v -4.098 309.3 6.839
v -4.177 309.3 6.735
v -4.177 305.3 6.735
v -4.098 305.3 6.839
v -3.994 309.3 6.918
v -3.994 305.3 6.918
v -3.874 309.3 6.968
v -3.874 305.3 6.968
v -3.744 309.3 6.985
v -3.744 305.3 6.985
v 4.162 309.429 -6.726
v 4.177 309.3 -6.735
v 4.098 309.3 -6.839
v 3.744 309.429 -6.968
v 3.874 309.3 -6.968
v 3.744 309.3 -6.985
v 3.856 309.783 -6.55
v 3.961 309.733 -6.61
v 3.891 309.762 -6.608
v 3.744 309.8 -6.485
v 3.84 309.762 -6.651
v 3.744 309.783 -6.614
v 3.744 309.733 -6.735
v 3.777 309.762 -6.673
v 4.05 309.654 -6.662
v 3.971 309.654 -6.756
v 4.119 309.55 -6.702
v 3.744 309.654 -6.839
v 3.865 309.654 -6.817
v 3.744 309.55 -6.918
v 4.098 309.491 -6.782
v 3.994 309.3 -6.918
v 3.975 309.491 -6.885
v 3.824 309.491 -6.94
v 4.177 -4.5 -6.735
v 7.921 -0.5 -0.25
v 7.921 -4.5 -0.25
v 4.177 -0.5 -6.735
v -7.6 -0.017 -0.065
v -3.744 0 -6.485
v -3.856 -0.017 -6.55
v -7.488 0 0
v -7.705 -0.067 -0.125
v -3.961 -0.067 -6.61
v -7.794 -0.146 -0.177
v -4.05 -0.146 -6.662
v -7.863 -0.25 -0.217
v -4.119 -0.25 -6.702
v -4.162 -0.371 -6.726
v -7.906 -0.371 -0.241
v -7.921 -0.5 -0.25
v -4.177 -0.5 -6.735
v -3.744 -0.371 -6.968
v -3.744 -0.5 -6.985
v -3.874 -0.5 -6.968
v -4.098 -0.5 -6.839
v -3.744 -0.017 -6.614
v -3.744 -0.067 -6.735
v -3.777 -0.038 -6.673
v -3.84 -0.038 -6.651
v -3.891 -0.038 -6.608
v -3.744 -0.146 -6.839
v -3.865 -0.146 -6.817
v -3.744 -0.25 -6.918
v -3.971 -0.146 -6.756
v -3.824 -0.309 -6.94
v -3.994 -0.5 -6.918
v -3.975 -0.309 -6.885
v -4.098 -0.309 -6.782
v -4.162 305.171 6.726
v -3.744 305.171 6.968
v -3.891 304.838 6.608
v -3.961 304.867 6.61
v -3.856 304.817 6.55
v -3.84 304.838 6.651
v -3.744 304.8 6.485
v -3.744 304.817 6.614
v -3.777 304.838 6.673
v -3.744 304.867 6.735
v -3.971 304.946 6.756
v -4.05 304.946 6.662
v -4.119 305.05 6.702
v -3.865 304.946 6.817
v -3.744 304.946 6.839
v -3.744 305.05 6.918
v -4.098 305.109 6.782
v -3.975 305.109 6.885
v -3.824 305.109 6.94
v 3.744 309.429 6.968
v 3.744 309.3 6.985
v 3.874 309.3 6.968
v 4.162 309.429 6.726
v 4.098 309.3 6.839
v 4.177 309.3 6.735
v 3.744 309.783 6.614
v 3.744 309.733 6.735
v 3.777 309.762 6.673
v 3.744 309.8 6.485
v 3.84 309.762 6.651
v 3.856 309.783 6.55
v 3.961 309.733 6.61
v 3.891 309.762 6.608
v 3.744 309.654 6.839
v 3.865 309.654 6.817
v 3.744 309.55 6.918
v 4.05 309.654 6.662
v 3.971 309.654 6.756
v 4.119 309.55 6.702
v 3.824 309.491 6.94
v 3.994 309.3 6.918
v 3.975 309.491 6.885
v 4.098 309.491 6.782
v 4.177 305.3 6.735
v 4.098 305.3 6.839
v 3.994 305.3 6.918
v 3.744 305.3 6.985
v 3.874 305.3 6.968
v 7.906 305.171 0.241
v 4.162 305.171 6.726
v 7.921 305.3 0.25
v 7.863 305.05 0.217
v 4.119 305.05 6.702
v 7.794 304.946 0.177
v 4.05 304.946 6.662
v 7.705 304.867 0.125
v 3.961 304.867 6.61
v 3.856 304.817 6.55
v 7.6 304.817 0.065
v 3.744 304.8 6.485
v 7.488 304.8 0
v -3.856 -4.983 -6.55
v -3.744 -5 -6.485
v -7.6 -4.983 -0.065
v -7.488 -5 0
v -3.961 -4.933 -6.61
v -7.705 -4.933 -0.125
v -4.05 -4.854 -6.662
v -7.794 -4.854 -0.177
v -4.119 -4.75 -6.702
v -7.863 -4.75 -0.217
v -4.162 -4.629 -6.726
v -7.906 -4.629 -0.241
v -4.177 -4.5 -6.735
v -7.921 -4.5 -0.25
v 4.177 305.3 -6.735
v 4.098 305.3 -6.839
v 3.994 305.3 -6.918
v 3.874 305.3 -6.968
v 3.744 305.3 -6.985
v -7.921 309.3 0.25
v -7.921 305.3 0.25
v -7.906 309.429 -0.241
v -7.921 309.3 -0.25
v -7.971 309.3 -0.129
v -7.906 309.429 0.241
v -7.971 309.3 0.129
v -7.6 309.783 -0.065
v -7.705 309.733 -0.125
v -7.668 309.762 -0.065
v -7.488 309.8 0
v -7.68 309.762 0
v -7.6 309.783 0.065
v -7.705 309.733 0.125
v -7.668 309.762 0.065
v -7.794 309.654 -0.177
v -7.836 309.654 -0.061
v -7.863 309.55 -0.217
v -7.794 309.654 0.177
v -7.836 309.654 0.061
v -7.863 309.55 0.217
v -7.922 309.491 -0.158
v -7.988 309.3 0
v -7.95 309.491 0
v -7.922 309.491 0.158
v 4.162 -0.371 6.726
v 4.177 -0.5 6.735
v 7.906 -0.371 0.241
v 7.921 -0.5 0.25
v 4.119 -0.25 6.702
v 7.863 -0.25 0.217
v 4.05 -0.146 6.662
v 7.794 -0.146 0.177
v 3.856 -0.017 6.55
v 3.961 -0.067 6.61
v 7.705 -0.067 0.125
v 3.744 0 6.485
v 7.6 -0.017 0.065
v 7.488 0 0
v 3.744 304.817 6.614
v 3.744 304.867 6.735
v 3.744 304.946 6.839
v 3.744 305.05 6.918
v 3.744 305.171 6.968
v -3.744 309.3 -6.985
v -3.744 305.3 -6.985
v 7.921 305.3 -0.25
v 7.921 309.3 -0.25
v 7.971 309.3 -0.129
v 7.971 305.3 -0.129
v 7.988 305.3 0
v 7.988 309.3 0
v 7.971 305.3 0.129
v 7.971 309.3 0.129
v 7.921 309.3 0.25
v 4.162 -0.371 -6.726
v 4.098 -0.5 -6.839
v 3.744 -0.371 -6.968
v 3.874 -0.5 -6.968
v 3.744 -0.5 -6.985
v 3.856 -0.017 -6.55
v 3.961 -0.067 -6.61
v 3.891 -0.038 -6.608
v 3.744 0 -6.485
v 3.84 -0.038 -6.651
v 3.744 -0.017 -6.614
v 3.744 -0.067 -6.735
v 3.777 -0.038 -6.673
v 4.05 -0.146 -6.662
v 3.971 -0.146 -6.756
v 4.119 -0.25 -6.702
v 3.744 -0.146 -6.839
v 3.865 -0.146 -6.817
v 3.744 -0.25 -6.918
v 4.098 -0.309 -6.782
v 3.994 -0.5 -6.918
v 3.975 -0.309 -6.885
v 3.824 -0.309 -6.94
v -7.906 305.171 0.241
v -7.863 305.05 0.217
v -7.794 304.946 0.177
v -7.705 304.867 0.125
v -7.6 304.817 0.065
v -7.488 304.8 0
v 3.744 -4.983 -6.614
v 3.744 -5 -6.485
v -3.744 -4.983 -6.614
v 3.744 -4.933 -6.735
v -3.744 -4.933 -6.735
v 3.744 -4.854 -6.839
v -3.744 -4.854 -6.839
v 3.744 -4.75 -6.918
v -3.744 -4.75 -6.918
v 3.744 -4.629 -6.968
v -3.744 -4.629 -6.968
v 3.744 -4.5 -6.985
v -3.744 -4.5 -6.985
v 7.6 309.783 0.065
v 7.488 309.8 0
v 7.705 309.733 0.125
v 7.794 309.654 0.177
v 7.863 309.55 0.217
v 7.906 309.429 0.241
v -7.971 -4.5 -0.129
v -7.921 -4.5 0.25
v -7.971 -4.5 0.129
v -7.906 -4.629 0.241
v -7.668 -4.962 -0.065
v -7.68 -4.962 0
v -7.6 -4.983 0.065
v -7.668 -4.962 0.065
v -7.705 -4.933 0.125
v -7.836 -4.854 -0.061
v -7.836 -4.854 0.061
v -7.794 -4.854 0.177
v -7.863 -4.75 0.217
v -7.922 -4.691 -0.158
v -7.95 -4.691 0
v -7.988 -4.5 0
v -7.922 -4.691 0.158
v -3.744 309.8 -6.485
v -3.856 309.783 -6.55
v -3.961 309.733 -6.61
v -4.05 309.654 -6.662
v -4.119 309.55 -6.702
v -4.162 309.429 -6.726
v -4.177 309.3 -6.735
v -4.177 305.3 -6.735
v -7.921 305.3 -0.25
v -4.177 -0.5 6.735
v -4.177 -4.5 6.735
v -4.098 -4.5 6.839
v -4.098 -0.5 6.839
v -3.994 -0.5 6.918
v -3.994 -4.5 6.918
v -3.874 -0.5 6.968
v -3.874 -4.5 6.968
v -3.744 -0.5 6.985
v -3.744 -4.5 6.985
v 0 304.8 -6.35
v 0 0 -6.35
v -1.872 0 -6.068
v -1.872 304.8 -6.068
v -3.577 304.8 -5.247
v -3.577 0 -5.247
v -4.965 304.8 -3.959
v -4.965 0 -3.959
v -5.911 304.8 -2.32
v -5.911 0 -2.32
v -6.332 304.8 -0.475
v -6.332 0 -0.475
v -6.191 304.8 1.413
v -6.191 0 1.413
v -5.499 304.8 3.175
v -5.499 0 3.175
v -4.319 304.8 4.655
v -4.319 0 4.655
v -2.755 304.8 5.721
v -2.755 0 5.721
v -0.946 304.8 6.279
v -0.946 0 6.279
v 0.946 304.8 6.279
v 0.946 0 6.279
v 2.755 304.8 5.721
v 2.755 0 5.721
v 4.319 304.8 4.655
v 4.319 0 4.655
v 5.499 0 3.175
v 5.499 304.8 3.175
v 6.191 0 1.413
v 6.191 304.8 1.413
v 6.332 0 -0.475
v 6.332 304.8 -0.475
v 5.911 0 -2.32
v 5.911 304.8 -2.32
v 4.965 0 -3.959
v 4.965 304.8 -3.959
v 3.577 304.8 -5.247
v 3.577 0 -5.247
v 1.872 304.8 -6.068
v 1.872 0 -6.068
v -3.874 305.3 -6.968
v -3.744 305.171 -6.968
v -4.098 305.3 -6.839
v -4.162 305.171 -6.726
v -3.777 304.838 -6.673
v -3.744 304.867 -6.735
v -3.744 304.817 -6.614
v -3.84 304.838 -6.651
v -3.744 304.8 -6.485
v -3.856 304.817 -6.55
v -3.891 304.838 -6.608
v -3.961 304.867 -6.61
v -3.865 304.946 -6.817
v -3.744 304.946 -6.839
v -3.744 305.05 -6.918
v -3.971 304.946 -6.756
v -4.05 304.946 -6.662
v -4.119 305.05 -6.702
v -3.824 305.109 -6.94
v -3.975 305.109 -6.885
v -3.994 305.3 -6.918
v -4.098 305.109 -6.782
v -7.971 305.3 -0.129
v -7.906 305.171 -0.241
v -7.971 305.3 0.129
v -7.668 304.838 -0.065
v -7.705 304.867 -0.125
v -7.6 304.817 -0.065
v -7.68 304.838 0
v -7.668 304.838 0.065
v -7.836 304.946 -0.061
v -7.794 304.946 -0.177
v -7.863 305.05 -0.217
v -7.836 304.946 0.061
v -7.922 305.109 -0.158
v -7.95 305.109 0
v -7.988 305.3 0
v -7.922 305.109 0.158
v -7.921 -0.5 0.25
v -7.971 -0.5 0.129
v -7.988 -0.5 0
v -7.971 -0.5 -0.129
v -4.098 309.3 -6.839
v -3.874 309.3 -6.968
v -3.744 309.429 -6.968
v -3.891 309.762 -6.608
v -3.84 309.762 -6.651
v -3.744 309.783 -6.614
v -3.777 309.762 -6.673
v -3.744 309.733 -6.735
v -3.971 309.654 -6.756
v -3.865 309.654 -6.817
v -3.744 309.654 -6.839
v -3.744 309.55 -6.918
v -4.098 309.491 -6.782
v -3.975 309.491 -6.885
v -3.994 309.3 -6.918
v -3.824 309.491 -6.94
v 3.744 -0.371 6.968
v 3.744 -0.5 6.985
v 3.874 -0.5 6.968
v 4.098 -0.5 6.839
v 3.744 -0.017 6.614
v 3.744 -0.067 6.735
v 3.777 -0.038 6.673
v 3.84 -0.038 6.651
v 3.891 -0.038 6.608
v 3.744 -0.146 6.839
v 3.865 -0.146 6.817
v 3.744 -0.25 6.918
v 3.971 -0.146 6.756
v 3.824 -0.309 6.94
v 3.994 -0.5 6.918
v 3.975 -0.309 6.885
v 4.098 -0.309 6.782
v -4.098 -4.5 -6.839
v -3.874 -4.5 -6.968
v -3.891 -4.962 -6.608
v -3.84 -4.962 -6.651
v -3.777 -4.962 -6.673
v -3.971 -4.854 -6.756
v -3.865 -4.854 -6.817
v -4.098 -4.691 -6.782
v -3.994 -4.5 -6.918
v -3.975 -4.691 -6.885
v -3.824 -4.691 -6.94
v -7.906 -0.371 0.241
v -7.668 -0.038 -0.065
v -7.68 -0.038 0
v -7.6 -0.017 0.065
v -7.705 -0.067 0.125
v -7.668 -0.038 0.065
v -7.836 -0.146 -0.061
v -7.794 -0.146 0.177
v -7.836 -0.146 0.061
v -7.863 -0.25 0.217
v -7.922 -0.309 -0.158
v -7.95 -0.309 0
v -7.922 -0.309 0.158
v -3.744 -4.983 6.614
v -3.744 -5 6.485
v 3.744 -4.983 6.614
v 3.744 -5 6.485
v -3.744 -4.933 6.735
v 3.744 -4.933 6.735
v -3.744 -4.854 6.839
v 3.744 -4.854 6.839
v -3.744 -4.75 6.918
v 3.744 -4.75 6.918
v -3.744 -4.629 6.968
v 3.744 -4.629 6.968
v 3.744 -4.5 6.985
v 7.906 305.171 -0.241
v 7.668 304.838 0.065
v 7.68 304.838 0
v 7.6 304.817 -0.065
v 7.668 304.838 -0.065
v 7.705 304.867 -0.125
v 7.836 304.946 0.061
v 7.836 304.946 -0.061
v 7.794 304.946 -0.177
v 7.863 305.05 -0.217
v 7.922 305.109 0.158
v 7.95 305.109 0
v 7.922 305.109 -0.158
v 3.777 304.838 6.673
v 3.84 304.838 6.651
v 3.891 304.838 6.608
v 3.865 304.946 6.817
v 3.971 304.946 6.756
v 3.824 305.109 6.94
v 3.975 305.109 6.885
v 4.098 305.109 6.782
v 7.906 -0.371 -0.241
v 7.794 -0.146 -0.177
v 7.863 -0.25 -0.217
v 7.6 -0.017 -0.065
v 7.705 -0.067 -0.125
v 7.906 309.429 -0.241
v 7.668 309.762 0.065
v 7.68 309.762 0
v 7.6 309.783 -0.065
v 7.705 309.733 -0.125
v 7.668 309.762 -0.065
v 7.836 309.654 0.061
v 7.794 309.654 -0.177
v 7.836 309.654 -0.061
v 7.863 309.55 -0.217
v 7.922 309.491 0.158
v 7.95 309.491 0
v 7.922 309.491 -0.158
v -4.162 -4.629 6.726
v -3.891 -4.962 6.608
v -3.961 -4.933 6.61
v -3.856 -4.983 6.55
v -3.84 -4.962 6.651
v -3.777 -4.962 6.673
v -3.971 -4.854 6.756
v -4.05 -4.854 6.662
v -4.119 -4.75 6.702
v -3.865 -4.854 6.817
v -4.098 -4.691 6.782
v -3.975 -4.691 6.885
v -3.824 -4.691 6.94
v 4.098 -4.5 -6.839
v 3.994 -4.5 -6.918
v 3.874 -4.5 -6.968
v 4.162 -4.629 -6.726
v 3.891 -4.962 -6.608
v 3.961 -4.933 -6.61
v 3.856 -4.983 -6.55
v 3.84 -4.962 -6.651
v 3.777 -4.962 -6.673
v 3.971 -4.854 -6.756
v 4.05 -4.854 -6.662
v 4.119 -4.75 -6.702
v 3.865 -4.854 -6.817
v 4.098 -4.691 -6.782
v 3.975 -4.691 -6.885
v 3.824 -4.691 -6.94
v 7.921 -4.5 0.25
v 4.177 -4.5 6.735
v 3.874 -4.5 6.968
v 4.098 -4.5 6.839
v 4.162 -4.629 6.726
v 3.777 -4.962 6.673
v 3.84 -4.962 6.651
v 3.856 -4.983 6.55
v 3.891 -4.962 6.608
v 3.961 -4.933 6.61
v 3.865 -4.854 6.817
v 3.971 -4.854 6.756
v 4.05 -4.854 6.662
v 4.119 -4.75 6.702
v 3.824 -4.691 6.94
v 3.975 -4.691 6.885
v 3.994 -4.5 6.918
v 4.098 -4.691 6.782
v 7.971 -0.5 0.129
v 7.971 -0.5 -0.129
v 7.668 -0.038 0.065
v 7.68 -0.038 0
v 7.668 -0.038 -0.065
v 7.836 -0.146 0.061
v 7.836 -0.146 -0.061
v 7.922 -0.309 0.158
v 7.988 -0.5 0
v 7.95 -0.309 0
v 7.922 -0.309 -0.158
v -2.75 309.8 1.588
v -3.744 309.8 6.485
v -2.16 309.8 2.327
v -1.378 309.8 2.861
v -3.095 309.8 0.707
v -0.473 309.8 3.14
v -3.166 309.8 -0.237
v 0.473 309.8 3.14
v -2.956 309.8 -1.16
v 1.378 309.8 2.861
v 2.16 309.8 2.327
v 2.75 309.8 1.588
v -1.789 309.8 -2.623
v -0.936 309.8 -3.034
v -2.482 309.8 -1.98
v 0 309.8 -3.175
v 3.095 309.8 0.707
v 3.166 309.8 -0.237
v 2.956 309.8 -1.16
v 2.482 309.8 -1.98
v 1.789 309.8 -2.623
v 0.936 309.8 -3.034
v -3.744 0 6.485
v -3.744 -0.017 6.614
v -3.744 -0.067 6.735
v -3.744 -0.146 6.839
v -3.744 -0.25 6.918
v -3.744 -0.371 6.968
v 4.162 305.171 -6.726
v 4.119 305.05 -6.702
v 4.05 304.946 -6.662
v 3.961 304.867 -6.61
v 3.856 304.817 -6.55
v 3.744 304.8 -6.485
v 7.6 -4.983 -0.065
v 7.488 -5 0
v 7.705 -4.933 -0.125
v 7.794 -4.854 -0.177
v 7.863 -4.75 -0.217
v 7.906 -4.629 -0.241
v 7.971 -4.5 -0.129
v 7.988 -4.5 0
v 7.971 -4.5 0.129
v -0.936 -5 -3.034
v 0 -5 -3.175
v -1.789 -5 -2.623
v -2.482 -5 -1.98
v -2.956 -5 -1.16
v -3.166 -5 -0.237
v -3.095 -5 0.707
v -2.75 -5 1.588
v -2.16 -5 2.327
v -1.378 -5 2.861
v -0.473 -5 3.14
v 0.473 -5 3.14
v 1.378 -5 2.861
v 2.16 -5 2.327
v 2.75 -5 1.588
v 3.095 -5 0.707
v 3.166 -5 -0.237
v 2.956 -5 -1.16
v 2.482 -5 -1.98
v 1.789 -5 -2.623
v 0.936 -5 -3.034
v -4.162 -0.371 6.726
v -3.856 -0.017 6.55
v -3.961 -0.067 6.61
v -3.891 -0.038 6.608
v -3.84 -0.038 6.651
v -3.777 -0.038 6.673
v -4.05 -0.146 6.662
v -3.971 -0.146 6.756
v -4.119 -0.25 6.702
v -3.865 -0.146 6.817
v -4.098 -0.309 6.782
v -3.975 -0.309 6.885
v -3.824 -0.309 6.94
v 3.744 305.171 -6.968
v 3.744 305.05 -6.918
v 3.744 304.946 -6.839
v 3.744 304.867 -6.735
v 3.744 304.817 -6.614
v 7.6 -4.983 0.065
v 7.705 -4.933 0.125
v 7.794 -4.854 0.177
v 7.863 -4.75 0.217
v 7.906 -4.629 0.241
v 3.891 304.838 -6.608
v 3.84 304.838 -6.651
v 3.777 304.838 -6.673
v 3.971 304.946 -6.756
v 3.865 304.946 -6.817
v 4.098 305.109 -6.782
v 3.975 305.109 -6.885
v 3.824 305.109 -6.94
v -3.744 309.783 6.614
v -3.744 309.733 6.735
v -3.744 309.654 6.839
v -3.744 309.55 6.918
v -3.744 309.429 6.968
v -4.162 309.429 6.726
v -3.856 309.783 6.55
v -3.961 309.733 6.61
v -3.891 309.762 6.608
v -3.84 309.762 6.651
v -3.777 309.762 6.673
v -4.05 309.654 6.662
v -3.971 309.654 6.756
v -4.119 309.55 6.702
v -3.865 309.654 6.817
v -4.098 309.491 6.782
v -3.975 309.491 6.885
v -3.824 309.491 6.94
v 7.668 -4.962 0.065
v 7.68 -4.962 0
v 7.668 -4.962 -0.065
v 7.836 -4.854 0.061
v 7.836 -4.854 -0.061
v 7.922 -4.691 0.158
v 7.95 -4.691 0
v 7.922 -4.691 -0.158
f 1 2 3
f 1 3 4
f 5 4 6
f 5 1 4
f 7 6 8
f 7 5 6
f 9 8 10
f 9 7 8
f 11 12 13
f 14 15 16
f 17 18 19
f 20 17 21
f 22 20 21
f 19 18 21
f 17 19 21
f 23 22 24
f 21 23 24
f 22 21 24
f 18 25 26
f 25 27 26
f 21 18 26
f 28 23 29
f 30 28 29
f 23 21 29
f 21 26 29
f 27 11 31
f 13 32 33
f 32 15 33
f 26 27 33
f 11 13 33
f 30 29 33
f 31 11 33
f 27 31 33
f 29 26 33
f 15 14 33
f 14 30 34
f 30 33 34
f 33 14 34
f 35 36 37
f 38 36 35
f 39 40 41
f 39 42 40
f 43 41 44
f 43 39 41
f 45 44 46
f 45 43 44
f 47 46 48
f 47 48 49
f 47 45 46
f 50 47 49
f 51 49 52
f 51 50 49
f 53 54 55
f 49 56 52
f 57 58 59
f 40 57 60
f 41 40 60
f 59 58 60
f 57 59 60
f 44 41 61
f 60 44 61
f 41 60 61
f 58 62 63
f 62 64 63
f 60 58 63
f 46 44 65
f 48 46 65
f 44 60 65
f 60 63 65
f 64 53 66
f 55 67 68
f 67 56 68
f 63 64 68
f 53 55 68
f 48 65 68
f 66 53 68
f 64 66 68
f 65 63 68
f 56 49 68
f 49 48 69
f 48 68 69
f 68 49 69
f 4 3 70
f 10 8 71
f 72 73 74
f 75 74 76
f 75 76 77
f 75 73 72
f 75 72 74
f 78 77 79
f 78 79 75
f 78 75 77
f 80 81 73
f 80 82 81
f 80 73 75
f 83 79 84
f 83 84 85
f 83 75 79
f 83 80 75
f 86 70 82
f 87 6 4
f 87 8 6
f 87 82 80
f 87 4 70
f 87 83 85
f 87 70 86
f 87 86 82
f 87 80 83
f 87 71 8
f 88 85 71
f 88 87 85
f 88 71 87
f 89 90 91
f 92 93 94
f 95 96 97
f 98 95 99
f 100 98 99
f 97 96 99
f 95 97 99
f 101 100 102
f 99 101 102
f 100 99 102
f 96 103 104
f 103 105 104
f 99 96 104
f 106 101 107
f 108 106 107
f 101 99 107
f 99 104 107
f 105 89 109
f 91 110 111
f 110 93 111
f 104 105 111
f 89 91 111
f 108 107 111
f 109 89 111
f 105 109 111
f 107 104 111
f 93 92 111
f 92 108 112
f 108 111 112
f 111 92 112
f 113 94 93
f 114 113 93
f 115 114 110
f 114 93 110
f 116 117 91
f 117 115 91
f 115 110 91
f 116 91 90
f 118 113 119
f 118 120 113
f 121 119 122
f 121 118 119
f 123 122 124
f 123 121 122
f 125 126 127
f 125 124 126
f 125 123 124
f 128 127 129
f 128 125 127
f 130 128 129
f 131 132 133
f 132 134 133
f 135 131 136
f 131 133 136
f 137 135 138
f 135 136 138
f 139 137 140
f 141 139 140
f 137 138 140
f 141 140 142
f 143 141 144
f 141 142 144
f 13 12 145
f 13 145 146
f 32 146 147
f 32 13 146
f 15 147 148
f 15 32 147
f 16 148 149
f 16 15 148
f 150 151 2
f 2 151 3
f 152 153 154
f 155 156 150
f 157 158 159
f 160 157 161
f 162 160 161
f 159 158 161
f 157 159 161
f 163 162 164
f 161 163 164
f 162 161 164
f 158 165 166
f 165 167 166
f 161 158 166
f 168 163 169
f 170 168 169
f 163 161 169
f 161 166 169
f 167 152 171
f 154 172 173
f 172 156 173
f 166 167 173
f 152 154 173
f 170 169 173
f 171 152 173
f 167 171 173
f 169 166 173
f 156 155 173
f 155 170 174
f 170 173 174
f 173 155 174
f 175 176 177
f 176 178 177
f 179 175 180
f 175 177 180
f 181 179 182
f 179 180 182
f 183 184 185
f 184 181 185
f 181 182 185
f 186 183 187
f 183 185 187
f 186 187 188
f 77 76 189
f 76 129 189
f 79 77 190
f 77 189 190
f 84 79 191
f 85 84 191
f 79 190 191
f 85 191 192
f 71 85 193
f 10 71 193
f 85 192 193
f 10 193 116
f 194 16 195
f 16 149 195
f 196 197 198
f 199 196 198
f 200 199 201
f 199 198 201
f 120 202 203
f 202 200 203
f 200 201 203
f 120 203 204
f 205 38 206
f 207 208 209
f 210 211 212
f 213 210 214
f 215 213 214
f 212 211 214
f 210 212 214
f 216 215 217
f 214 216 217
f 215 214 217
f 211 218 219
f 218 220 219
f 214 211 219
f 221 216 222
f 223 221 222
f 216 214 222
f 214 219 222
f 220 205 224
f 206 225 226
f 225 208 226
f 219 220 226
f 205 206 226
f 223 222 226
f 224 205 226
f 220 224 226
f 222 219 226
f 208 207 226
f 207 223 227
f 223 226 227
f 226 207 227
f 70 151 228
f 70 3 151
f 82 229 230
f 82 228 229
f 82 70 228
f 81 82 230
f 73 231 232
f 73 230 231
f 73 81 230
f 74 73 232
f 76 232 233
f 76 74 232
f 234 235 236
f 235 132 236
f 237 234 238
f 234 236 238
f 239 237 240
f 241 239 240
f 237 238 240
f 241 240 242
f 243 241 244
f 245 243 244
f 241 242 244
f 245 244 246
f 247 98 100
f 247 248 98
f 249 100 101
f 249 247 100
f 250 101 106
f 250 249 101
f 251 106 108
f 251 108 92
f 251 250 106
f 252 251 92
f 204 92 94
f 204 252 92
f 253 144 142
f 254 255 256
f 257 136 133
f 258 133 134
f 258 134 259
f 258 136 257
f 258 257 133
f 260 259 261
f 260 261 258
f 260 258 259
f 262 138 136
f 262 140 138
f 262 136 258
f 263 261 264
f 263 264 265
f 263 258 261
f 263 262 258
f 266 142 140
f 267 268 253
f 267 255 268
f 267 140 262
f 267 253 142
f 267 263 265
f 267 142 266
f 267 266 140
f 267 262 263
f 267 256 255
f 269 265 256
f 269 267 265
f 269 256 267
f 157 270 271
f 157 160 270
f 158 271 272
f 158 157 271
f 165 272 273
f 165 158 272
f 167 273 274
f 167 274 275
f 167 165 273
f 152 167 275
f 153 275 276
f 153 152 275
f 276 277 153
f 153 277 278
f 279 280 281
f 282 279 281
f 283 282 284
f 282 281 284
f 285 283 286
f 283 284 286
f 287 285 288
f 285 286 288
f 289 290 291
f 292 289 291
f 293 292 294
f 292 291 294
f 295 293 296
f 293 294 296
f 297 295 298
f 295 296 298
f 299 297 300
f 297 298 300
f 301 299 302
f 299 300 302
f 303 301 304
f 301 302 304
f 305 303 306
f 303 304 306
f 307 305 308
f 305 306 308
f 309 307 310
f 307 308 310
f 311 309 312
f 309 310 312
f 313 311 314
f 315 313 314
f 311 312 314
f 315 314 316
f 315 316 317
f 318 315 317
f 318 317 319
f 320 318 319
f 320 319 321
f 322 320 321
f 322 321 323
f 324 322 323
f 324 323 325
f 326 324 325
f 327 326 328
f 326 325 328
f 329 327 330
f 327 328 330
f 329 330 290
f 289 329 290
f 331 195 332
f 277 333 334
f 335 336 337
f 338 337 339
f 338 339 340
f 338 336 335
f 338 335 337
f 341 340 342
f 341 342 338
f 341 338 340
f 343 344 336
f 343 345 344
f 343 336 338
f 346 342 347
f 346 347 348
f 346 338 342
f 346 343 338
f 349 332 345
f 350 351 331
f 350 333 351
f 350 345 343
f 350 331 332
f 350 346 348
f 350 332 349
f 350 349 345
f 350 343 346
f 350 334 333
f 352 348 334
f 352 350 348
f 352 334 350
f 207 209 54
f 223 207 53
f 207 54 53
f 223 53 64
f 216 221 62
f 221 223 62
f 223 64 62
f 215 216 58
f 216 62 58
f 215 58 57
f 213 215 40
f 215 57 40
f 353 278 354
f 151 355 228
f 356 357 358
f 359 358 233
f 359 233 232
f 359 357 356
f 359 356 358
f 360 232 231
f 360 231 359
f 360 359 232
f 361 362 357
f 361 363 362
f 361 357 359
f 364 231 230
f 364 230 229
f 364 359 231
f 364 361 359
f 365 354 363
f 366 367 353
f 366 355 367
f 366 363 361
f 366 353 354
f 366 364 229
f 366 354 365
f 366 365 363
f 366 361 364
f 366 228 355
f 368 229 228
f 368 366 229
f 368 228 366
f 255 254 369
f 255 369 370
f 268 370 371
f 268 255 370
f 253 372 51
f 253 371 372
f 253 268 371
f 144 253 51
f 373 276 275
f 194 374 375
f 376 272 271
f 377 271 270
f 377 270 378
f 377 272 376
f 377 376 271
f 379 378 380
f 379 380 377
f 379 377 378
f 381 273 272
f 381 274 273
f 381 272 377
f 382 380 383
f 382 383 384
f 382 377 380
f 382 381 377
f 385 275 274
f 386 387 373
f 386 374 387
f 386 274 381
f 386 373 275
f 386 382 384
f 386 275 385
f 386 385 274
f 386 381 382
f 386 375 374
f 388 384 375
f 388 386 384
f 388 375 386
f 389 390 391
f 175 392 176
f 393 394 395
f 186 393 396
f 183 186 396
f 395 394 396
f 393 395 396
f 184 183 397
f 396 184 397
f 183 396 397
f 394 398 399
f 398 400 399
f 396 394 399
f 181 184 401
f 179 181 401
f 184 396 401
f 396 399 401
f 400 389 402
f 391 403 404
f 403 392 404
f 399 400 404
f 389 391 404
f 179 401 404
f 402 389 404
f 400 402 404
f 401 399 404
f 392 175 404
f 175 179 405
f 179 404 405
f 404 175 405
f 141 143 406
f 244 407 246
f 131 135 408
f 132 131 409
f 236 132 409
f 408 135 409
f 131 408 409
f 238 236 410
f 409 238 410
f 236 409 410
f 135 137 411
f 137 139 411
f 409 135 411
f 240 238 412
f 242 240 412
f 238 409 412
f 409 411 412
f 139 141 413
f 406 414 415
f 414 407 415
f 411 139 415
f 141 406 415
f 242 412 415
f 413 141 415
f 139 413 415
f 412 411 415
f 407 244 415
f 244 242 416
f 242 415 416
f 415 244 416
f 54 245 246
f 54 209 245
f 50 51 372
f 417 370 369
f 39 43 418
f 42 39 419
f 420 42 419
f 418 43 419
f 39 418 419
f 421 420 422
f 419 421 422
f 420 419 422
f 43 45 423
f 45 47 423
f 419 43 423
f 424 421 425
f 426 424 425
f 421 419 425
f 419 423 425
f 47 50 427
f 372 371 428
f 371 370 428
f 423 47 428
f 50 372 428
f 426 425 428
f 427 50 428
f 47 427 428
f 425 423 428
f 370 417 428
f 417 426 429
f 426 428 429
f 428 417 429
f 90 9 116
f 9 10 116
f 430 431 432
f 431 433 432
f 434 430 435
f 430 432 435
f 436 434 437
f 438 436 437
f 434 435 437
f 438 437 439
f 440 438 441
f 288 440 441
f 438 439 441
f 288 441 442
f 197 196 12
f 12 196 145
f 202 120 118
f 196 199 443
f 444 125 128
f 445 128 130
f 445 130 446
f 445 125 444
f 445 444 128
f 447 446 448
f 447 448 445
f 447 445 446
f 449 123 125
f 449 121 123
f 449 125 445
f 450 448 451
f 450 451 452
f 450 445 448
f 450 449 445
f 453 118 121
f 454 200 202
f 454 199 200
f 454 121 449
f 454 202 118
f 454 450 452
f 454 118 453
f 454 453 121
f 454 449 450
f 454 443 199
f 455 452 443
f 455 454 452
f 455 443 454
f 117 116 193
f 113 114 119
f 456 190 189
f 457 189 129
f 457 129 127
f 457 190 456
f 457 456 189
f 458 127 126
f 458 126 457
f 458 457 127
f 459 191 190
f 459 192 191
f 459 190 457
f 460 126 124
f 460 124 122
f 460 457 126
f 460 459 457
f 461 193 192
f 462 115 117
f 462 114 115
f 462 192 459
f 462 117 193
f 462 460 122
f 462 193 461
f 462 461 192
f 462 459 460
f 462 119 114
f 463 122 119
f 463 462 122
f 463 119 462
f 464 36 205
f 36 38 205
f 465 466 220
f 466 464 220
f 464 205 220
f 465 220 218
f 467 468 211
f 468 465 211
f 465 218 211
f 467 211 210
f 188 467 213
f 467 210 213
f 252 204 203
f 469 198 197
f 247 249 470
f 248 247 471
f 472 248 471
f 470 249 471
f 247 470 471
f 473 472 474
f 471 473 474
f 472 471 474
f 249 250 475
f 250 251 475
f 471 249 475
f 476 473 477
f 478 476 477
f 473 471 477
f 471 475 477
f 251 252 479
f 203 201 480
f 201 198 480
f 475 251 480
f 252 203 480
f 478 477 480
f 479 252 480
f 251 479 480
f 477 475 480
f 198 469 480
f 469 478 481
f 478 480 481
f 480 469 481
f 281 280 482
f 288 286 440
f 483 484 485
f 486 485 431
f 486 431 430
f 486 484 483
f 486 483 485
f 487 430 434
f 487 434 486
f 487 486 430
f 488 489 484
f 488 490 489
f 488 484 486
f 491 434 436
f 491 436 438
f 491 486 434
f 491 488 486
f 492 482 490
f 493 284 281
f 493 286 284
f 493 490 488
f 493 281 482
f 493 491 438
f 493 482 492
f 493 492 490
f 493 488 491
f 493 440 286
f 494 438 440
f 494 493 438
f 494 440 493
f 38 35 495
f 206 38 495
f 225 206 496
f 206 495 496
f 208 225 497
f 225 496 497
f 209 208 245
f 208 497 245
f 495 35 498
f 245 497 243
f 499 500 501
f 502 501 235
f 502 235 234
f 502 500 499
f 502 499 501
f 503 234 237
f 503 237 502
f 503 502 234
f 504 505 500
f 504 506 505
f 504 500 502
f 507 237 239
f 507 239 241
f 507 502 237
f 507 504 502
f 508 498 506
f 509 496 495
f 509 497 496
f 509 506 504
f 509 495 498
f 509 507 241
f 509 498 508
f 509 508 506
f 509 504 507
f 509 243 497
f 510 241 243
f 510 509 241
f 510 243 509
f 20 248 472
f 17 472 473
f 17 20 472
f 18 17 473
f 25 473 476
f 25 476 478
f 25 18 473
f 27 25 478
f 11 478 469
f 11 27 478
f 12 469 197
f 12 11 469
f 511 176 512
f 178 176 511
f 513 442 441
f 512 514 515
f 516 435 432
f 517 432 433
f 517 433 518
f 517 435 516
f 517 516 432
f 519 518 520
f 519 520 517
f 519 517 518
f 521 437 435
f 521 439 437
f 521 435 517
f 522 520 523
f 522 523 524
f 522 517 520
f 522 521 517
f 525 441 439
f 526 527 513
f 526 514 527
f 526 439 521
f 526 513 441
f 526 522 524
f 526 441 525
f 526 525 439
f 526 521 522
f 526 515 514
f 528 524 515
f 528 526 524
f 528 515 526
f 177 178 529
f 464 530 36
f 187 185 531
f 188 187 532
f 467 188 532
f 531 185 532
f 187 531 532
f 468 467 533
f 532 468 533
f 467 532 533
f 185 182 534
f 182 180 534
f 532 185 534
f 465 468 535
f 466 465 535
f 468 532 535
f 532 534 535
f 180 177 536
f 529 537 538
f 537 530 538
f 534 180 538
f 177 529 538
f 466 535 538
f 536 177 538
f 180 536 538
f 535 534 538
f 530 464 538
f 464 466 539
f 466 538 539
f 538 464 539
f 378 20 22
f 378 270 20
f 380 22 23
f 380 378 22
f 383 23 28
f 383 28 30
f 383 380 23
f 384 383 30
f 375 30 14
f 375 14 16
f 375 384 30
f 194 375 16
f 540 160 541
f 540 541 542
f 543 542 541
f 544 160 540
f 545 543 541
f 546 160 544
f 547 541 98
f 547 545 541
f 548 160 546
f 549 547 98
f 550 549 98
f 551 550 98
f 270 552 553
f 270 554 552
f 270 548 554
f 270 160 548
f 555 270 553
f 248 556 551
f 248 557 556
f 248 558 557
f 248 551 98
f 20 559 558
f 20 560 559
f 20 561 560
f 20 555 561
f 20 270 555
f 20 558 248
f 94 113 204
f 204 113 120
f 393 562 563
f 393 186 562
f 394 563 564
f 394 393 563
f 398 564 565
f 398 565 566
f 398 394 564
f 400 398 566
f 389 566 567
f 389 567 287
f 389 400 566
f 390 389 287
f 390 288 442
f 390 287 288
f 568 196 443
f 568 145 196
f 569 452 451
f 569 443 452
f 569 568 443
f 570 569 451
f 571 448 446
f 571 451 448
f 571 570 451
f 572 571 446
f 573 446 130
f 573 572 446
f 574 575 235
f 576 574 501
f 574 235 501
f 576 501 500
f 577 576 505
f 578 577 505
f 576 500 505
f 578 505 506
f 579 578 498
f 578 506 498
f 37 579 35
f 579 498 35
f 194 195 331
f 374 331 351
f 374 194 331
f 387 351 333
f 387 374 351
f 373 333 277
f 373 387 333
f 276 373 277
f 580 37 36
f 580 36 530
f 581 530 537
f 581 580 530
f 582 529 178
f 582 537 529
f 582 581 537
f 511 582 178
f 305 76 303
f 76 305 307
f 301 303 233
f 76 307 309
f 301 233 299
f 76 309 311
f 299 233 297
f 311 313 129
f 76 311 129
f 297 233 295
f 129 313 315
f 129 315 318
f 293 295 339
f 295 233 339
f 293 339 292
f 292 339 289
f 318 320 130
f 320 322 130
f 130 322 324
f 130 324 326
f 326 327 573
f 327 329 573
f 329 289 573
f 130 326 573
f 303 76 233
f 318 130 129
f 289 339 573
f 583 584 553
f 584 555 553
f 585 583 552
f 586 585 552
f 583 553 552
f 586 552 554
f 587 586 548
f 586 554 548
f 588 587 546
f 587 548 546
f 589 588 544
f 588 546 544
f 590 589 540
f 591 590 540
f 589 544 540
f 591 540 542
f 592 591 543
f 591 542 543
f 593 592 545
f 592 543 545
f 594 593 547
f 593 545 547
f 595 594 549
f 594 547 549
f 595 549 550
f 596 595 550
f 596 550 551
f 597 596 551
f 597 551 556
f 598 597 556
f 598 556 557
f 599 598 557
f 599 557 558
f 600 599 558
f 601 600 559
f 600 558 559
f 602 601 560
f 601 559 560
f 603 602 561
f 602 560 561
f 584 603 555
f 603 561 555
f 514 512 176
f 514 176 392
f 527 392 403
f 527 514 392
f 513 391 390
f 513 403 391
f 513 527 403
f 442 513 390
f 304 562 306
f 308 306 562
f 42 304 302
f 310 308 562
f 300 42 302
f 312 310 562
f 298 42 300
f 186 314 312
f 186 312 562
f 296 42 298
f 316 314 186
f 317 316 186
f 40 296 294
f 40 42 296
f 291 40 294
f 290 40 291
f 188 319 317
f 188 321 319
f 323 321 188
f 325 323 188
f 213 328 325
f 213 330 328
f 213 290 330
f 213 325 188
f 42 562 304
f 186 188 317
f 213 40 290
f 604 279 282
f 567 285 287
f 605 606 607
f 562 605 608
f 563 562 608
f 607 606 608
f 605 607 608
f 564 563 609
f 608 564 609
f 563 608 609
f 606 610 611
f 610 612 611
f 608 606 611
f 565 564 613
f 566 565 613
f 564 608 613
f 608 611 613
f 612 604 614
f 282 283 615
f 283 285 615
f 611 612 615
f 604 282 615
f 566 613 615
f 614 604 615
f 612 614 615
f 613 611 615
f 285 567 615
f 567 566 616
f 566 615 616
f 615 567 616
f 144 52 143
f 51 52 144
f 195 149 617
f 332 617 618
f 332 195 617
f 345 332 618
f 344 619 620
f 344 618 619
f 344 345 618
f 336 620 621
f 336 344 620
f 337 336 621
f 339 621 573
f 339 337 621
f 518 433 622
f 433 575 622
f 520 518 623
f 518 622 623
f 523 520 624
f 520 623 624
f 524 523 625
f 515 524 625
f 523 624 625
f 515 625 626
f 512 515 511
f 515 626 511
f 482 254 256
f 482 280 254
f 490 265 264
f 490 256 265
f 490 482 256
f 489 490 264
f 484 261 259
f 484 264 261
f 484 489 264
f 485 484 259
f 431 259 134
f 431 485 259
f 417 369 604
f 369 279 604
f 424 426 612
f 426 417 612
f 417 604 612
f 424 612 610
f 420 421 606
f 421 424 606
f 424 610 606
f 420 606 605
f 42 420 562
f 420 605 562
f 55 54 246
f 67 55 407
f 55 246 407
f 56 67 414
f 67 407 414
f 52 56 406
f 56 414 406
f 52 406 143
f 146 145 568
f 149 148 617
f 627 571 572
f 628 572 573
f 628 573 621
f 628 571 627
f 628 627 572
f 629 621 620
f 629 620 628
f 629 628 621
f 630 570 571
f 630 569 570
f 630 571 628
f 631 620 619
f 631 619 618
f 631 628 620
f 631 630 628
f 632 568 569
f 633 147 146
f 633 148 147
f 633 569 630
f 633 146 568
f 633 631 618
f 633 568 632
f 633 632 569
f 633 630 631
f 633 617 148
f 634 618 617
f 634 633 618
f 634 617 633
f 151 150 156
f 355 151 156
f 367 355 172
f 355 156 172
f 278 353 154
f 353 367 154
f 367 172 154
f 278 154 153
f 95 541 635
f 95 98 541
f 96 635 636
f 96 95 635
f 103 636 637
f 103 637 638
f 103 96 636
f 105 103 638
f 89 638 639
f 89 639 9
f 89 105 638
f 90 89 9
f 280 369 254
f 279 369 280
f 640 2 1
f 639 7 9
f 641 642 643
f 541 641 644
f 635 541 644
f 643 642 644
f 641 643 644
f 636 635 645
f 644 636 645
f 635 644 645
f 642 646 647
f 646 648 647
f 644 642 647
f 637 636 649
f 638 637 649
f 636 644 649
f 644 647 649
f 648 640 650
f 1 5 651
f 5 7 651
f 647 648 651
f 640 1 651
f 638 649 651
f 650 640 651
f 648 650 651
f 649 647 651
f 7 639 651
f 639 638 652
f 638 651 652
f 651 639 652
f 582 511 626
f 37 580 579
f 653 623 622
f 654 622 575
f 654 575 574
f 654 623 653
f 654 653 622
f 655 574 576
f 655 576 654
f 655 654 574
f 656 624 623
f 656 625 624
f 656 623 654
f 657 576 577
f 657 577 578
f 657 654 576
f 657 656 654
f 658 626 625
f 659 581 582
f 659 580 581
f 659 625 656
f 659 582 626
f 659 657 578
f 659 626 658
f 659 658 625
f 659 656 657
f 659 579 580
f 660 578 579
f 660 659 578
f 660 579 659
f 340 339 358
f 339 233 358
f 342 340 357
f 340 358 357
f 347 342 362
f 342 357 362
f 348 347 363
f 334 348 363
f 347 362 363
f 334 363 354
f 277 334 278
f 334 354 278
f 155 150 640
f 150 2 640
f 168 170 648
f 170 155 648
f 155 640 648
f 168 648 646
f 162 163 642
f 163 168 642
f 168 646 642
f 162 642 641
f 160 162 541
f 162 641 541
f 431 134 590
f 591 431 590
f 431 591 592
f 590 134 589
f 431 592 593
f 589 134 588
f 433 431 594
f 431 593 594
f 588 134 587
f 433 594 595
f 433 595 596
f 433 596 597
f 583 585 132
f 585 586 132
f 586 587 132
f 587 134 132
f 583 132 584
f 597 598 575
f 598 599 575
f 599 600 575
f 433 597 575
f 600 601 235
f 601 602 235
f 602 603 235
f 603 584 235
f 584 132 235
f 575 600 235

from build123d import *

# Parameters (mm, degrees)
SKETCH1_R            = 6.35
SKETCH1_R_2          = 3.175
BOSS_EXTRUDE1_DEPTH  = 304.8
SKETCH2_R            = 3.175
BOSS_EXTRUDE2_DEPTH  = 5
FILLET1_R            = 0.5
FILLET1_OF_MIRROR1_R = 0.5


with BuildPart() as part:
    # Sketch1 → Boss-Extrude1 (new body)
    with BuildSketch(Plane(origin=(0, 0, 0), x_dir=(1, 0, 0), z_dir=(0, 1, 0))):
        with Locations(Location((0, 0, 0), (0, 0, 90))):
            Circle(SKETCH1_R)
        with Locations(Location((0, 0, 0), (0, 0, 90))):
            Circle(SKETCH1_R_2, mode=Mode.SUBTRACT)
    extrude(amount=BOSS_EXTRUDE1_DEPTH)

    # Sketch2 → Boss-Extrude2 (add)
    with BuildSketch(Plane(origin=(0, 304.8, 0), x_dir=(1, 0, 0), z_dir=(0, 1, 0))):
        Polygon((-8.065583261, 0), (-4.03279163, -6.985), (4.03279163, -6.985), (8.065583261, 0), (4.03279163, 6.985), (-4.03279163, 6.985), align=None)
        with Locations(Location((0, 0, 0), (0, 0, 90))):
            Circle(SKETCH2_R, mode=Mode.SUBTRACT)
    boss_extrude2 = extrude(amount=BOSS_EXTRUDE2_DEPTH)

    # Fillet1
    fillet1_edges = [part.edges().sort_by_distance(p)[0] for p in [
        (-6.049187445, 309.8, -3.4925),
        (-6.049187445, 309.8, 3.4925),
        (0, 309.8, 6.985),
        (6.049187445, 309.8, 3.4925),
        (6.049187445, 309.8, -3.4925),
        (0, 309.8, -6.985),
        (-6.049187445, 304.8, -3.4925),
        (-4.03279163, 307.3, -6.985),
        (-6.049187445, 304.8, 3.4925),
        (-8.065583261, 307.3, 0),
        (0, 304.8, 6.985),
        (-4.03279163, 307.3, 6.985),
        (6.049187445, 304.8, 3.4925),
        (4.03279163, 307.3, 6.985),
        (6.049187445, 304.8, -3.4925),
        (8.065583261, 307.3, 0),
        (0, 304.8, -6.985),
        (4.03279163, 307.3, -6.985),
    ]]
    fillet(fillet1_edges, radius=FILLET1_R)

    # Mirror1: Boss-Extrude2 across plane
    add(boss_extrude2.mirror(Plane.ZX.offset(152.4)))

    # Fillet1 of Mirror1
    fillet1_of_mirror1_edges = [part.edges().sort_by_distance(p)[0] for p in [
        (-6.049187445, -5, -3.4925),
        (-6.049187445, -5, 3.4925),
        (0, -5, 6.985),
        (6.049187445, -5, 3.4925),
        (6.049187445, -5, -3.4925),
        (0, -5, -6.985),
        (-6.049187445, 0, -3.4925),
        (-4.03279163, -2.5, -6.985),
        (-6.049187445, 0, 3.4925),
        (-8.065583261, -2.5, 0),
        (0, 0, 6.985),
        (-4.03279163, -2.5, 6.985),
        (6.049187445, 0, 3.4925),
        (4.03279163, -2.5, 6.985),
        (6.049187445, 0, -3.4925),
        (8.065583261, -2.5, 0),
        (0, 0, -6.985),
        (4.03279163, -2.5, -6.985),
    ]]
    fillet(fillet1_of_mirror1_edges, radius=FILLET1_OF_MIRROR1_R)


solid = part.part
